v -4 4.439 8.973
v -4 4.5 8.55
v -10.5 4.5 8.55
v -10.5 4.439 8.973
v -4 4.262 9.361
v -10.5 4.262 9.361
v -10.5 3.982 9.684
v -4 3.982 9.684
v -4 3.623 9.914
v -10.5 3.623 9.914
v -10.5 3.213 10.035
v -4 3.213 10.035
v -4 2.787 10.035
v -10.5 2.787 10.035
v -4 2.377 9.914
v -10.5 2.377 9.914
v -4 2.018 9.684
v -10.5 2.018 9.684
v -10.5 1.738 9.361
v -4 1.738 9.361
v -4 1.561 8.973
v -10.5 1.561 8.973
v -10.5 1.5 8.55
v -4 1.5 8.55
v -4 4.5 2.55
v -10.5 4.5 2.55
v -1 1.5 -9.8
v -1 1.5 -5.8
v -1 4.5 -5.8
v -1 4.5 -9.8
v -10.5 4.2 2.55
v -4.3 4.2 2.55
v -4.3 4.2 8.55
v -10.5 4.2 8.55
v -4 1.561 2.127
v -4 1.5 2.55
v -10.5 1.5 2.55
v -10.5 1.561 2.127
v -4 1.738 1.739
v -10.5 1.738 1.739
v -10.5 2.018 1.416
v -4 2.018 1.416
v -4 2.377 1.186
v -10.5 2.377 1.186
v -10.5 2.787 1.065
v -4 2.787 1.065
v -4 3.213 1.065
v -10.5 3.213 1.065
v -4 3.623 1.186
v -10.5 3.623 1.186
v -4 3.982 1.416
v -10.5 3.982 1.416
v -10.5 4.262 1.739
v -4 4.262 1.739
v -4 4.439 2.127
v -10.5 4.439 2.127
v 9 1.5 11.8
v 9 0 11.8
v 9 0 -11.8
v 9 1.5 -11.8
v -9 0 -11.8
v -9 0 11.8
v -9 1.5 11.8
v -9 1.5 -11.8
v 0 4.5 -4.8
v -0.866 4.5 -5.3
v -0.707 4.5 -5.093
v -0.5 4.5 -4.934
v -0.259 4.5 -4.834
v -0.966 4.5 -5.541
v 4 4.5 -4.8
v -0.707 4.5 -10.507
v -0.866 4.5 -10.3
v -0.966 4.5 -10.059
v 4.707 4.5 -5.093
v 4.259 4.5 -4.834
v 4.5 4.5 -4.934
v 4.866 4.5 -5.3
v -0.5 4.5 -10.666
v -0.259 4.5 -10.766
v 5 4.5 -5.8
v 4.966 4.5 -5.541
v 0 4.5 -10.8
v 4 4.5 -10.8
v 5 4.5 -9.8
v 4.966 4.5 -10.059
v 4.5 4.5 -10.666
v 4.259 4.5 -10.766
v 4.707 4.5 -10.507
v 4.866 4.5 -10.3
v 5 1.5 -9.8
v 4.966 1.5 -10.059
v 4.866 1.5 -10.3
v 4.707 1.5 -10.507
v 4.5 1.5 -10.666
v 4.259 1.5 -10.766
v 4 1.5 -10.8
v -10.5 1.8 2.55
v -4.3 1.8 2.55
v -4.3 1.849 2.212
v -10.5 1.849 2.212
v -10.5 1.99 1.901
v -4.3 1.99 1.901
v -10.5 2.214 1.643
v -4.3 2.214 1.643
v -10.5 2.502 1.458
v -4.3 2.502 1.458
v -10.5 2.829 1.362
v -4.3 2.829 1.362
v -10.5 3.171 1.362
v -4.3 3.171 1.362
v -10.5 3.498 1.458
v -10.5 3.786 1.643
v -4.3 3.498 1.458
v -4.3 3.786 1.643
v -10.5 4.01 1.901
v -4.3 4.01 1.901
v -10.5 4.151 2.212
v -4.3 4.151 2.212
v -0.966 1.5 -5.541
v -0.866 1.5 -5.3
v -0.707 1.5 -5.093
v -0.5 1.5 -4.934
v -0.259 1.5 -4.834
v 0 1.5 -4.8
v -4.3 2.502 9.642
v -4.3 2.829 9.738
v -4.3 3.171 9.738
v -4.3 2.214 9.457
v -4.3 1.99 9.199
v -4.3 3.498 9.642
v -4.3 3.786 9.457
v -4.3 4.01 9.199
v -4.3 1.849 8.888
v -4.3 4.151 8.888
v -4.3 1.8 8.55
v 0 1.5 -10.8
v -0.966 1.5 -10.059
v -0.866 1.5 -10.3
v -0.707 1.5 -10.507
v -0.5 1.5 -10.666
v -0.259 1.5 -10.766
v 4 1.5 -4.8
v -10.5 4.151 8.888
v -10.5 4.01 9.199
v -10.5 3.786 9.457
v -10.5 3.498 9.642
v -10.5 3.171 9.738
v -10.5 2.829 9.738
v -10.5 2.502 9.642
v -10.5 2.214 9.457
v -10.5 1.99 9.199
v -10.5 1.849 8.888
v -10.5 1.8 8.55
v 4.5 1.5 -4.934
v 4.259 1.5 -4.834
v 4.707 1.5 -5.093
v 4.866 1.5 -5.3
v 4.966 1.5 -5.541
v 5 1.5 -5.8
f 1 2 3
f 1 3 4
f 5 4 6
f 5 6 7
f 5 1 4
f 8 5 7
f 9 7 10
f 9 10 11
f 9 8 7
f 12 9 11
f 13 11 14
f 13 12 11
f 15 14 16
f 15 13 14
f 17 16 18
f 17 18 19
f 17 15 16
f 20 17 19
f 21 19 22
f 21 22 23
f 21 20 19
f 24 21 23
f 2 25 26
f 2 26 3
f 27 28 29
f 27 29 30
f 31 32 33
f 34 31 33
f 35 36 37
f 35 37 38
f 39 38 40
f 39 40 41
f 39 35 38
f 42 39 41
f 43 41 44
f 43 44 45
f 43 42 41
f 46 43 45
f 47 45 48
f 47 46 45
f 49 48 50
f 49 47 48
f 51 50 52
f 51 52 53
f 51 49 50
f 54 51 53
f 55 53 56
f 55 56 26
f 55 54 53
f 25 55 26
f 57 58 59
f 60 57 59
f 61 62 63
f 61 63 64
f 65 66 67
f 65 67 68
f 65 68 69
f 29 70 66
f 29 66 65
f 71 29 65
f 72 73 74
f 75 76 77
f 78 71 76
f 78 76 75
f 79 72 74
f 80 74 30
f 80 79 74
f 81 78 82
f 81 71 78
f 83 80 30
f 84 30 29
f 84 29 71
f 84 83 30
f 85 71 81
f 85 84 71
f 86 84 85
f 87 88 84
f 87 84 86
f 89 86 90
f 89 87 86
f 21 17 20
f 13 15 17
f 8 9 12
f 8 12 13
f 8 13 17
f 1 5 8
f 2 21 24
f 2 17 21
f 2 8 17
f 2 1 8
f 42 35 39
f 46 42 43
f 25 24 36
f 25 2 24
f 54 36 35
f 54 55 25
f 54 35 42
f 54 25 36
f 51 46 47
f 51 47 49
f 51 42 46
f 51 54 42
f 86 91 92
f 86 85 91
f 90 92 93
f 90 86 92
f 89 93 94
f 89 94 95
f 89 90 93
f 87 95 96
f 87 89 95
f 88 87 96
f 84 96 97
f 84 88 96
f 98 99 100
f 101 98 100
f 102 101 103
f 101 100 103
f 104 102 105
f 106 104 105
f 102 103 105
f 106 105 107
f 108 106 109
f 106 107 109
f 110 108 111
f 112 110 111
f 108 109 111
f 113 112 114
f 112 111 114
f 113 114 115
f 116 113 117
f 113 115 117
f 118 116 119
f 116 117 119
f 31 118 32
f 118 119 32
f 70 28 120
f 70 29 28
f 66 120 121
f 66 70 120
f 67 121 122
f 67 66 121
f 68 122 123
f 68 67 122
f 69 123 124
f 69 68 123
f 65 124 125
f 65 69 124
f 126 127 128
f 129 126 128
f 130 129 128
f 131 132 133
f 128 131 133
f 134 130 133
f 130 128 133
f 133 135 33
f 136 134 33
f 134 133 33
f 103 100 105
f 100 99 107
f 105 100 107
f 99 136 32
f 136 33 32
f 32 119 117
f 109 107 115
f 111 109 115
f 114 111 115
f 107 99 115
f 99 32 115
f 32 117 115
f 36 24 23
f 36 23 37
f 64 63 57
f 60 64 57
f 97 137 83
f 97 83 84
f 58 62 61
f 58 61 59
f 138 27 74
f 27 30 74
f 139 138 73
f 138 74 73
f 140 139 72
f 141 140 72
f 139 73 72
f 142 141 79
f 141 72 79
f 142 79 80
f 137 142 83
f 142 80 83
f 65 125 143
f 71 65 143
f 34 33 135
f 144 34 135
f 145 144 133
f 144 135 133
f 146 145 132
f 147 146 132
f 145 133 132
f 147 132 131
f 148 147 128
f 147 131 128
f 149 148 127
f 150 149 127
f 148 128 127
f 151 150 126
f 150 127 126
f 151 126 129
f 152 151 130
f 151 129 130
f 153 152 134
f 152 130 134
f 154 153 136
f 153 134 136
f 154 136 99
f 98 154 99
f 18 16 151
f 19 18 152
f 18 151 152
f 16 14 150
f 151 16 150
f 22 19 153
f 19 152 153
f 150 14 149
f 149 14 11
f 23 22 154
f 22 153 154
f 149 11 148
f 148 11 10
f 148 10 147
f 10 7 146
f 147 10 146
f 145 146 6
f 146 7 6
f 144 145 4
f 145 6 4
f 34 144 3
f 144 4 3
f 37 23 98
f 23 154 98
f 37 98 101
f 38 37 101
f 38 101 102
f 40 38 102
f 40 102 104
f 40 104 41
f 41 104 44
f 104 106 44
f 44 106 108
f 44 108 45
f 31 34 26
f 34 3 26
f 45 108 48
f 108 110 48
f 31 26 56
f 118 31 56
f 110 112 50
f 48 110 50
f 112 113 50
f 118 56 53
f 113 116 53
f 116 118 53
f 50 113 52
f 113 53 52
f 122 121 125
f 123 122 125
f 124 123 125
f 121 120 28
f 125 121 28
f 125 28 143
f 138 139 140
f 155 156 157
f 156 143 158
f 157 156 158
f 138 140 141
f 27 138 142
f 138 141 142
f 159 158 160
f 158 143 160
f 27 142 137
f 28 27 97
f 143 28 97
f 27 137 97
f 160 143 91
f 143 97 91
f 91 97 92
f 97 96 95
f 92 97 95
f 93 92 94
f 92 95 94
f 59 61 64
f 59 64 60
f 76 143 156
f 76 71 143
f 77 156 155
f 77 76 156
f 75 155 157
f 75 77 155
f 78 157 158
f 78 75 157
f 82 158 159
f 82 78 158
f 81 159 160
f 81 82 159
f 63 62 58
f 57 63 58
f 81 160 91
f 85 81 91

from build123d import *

# Parameters (mm, degrees)
SKETCH1_W                = 18
SKETCH1_H                = 23.6
BOSS_EXTRUDE1_DEPTH      = 1.5
BOSS_EXTRUDE2_DEPTH      = 1.5
BOSS_EXTRUDE2_DEPTH_BACK = 5
SHELL1_T                 = -0.3
SKETCH4_W                = 6
SKETCH4_H                = 6
BOSS_EXTRUDE3_DEPTH      = 3
FILLET1_R                = 1


with BuildPart() as part:
    # Sketch1 → Boss-Extrude1 (new body)
    with BuildSketch(Plane(origin=(0, 0, 0), x_dir=(1, 0, 0), z_dir=(0, 1, 0))):
        Rectangle(SKETCH1_W, SKETCH1_H)
    extrude(amount=BOSS_EXTRUDE1_DEPTH)


with BuildPart() as body_2:
    # Sketch3 → Boss-Extrude2 (new, two sides: drawn at the far end of the back side and taken through both)
    with BuildSketch(Plane.ZY.offset(9).offset(-BOSS_EXTRUDE2_DEPTH_BACK)):
        with BuildLine():
            Line((2.55, 4.5), (8.55, 4.5))
            ThreePointArc((8.55, 4.5), (10.05, 3), (8.55, 1.5))
            Line((8.55, 1.5), (2.55, 1.5))
            ThreePointArc((2.55, 1.5), (1.05, 3), (2.55, 4.5))
        make_face()
    extrude(amount=BOSS_EXTRUDE2_DEPTH + BOSS_EXTRUDE2_DEPTH_BACK)

    # Shell1
    shell1_openings = [body_2.faces().sort_by_distance(p)[0] for p in [
        (-10.5, 3, 5.55),
    ]]
    offset(amount=SHELL1_T, openings=shell1_openings, kind=Kind.INTERSECTION)


with BuildPart() as body_3:
    # Sketch4 → Boss-Extrude3 (new body)
    with BuildSketch(Plane(origin=(0, 1.5, 0), x_dir=(1, 0, 0), z_dir=(0, 1, 0))):
        with Locations((2, 7.8)):
            Rectangle(SKETCH4_W, SKETCH4_H)
    extrude(amount=BOSS_EXTRUDE3_DEPTH)

    # Fillet1
    fillet1_edges = [body_3.edges().sort_by_distance(p)[0] for p in [
        (-1, 3, -10.8),
        (5, 3, -10.8),
        (5, 3, -4.8),
        (-1, 3, -4.8),
    ]]
    fillet(fillet1_edges, radius=FILLET1_R)


solid = Compound([part.part, body_2.part, body_3.part])
